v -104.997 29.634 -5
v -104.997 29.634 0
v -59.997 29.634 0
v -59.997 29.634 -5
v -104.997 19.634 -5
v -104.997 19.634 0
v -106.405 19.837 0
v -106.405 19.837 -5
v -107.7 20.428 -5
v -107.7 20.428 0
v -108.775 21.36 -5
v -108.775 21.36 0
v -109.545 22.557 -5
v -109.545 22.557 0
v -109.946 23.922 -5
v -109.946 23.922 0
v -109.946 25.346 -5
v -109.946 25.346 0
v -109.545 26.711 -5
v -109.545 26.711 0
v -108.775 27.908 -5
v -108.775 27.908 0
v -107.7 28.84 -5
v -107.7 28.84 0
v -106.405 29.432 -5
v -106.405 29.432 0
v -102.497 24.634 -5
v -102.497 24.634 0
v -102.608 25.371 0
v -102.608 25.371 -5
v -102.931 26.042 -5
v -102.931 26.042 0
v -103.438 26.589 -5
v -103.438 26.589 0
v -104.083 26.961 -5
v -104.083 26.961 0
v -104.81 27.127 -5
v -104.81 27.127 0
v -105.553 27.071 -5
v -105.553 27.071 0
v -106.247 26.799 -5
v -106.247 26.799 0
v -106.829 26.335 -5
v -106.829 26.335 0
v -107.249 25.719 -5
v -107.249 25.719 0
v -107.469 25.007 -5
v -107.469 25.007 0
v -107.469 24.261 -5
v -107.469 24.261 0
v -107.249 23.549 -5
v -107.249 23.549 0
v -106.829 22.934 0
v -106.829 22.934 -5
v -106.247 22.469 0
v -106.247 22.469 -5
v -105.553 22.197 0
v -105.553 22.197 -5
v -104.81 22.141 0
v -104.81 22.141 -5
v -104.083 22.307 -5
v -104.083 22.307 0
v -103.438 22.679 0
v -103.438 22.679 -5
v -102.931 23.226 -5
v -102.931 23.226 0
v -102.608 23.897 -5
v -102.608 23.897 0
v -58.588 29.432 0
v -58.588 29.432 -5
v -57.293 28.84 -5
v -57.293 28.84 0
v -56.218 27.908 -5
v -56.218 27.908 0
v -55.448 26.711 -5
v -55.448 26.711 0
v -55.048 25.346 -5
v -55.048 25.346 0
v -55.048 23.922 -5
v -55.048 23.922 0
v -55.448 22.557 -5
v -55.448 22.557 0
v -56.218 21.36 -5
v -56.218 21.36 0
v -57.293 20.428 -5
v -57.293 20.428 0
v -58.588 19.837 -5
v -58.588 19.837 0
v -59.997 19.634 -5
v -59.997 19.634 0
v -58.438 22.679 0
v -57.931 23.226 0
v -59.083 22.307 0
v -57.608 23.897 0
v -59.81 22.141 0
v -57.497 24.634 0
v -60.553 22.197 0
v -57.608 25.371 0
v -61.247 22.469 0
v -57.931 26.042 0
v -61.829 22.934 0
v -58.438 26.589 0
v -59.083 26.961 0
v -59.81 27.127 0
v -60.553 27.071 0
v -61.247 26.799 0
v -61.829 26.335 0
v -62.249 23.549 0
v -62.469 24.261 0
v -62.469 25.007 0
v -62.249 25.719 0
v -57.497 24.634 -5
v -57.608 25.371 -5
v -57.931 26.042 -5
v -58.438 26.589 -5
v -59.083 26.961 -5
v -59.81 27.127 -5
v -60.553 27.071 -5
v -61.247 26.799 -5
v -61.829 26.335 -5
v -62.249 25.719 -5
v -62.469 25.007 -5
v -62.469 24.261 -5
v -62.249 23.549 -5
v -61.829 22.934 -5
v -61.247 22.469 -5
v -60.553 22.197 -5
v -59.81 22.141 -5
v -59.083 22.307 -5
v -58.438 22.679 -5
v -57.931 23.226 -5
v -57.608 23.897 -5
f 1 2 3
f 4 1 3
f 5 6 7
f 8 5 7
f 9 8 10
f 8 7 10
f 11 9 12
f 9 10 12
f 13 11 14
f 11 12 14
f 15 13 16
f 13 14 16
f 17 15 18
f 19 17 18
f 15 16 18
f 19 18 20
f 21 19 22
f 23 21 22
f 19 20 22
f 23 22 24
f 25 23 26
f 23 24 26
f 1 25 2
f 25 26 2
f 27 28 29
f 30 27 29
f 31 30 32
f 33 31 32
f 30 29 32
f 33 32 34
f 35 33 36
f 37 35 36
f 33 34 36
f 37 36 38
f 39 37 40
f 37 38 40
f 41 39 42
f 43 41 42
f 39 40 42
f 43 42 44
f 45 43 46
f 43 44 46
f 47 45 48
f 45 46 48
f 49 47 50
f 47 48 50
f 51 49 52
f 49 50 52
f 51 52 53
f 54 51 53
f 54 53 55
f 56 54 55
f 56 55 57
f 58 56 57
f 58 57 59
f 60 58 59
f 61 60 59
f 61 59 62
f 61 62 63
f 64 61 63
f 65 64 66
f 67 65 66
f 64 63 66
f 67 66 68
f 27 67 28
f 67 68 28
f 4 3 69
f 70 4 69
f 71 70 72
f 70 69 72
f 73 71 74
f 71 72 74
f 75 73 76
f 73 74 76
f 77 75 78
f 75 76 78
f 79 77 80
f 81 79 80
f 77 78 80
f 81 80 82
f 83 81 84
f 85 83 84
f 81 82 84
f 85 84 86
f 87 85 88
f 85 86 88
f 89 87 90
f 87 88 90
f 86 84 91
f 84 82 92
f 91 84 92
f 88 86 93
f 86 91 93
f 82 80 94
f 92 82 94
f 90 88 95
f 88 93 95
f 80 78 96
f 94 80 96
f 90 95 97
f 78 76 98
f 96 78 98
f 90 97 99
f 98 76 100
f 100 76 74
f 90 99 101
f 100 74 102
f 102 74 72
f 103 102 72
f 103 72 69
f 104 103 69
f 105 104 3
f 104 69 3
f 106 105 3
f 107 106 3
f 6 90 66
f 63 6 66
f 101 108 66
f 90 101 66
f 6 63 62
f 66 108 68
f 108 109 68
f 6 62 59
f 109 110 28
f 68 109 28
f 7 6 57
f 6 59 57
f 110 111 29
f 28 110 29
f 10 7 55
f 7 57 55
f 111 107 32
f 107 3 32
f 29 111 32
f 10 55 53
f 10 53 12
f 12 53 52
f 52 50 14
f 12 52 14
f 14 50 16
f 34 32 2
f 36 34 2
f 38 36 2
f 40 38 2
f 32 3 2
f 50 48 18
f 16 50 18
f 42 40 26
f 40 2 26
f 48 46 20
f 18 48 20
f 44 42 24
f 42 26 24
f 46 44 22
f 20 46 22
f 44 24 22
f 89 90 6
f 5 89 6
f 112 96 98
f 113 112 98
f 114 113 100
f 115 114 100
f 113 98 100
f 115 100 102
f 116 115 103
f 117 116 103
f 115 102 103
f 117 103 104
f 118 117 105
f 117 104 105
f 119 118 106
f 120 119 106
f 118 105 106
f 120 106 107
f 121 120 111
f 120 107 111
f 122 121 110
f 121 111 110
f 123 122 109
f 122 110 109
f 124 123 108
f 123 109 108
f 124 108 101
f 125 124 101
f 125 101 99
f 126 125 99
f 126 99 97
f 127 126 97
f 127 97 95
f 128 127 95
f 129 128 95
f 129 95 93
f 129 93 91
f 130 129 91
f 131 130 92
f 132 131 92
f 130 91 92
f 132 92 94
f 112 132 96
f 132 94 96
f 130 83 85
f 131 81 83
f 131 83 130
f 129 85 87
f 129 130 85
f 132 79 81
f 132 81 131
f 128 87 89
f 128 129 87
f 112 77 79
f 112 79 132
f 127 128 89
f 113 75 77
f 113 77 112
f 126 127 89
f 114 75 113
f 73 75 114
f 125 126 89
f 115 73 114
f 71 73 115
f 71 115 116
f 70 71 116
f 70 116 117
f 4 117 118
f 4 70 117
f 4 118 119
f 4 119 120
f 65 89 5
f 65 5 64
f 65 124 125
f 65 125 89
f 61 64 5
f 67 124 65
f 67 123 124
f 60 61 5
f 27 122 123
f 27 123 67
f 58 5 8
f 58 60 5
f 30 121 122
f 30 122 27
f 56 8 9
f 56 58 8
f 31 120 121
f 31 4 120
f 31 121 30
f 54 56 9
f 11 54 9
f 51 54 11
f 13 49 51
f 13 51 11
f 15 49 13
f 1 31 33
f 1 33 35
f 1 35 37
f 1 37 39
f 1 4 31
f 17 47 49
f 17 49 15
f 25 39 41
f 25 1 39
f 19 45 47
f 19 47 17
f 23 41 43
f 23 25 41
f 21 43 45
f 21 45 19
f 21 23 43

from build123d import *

# Parameters (mm, degrees)
SKETCH1_R           = 2.5
BOSS_EXTRUDE1_DEPTH = 5


with BuildPart() as part:
    # Sketch1 → Boss-Extrude1 (new body)
    with BuildSketch(Plane.XY):
        with BuildLine():
            Line((-59.996652166, 19.634073567), (-104.996652166, 19.634073567))
            ThreePointArc((-104.996652166, 19.634073567), (-109.996652166, 24.634073567), (-104.996652166, 29.634073567))
            Line((-104.996652166, 29.634073567), (-59.996652166, 29.634073567))
            ThreePointArc((-59.996652166, 29.634073567), (-54.996652166, 24.634073567), (-59.996652166, 19.634073567))
        make_face()
        with Locations((-59.996652166, 24.634073567)):
            Circle(SKETCH1_R, mode=Mode.SUBTRACT)
        with Locations((-104.996652166, 24.634073567)):
            Circle(SKETCH1_R, mode=Mode.SUBTRACT)
    extrude(amount=-BOSS_EXTRUDE1_DEPTH)


solid = part.part
